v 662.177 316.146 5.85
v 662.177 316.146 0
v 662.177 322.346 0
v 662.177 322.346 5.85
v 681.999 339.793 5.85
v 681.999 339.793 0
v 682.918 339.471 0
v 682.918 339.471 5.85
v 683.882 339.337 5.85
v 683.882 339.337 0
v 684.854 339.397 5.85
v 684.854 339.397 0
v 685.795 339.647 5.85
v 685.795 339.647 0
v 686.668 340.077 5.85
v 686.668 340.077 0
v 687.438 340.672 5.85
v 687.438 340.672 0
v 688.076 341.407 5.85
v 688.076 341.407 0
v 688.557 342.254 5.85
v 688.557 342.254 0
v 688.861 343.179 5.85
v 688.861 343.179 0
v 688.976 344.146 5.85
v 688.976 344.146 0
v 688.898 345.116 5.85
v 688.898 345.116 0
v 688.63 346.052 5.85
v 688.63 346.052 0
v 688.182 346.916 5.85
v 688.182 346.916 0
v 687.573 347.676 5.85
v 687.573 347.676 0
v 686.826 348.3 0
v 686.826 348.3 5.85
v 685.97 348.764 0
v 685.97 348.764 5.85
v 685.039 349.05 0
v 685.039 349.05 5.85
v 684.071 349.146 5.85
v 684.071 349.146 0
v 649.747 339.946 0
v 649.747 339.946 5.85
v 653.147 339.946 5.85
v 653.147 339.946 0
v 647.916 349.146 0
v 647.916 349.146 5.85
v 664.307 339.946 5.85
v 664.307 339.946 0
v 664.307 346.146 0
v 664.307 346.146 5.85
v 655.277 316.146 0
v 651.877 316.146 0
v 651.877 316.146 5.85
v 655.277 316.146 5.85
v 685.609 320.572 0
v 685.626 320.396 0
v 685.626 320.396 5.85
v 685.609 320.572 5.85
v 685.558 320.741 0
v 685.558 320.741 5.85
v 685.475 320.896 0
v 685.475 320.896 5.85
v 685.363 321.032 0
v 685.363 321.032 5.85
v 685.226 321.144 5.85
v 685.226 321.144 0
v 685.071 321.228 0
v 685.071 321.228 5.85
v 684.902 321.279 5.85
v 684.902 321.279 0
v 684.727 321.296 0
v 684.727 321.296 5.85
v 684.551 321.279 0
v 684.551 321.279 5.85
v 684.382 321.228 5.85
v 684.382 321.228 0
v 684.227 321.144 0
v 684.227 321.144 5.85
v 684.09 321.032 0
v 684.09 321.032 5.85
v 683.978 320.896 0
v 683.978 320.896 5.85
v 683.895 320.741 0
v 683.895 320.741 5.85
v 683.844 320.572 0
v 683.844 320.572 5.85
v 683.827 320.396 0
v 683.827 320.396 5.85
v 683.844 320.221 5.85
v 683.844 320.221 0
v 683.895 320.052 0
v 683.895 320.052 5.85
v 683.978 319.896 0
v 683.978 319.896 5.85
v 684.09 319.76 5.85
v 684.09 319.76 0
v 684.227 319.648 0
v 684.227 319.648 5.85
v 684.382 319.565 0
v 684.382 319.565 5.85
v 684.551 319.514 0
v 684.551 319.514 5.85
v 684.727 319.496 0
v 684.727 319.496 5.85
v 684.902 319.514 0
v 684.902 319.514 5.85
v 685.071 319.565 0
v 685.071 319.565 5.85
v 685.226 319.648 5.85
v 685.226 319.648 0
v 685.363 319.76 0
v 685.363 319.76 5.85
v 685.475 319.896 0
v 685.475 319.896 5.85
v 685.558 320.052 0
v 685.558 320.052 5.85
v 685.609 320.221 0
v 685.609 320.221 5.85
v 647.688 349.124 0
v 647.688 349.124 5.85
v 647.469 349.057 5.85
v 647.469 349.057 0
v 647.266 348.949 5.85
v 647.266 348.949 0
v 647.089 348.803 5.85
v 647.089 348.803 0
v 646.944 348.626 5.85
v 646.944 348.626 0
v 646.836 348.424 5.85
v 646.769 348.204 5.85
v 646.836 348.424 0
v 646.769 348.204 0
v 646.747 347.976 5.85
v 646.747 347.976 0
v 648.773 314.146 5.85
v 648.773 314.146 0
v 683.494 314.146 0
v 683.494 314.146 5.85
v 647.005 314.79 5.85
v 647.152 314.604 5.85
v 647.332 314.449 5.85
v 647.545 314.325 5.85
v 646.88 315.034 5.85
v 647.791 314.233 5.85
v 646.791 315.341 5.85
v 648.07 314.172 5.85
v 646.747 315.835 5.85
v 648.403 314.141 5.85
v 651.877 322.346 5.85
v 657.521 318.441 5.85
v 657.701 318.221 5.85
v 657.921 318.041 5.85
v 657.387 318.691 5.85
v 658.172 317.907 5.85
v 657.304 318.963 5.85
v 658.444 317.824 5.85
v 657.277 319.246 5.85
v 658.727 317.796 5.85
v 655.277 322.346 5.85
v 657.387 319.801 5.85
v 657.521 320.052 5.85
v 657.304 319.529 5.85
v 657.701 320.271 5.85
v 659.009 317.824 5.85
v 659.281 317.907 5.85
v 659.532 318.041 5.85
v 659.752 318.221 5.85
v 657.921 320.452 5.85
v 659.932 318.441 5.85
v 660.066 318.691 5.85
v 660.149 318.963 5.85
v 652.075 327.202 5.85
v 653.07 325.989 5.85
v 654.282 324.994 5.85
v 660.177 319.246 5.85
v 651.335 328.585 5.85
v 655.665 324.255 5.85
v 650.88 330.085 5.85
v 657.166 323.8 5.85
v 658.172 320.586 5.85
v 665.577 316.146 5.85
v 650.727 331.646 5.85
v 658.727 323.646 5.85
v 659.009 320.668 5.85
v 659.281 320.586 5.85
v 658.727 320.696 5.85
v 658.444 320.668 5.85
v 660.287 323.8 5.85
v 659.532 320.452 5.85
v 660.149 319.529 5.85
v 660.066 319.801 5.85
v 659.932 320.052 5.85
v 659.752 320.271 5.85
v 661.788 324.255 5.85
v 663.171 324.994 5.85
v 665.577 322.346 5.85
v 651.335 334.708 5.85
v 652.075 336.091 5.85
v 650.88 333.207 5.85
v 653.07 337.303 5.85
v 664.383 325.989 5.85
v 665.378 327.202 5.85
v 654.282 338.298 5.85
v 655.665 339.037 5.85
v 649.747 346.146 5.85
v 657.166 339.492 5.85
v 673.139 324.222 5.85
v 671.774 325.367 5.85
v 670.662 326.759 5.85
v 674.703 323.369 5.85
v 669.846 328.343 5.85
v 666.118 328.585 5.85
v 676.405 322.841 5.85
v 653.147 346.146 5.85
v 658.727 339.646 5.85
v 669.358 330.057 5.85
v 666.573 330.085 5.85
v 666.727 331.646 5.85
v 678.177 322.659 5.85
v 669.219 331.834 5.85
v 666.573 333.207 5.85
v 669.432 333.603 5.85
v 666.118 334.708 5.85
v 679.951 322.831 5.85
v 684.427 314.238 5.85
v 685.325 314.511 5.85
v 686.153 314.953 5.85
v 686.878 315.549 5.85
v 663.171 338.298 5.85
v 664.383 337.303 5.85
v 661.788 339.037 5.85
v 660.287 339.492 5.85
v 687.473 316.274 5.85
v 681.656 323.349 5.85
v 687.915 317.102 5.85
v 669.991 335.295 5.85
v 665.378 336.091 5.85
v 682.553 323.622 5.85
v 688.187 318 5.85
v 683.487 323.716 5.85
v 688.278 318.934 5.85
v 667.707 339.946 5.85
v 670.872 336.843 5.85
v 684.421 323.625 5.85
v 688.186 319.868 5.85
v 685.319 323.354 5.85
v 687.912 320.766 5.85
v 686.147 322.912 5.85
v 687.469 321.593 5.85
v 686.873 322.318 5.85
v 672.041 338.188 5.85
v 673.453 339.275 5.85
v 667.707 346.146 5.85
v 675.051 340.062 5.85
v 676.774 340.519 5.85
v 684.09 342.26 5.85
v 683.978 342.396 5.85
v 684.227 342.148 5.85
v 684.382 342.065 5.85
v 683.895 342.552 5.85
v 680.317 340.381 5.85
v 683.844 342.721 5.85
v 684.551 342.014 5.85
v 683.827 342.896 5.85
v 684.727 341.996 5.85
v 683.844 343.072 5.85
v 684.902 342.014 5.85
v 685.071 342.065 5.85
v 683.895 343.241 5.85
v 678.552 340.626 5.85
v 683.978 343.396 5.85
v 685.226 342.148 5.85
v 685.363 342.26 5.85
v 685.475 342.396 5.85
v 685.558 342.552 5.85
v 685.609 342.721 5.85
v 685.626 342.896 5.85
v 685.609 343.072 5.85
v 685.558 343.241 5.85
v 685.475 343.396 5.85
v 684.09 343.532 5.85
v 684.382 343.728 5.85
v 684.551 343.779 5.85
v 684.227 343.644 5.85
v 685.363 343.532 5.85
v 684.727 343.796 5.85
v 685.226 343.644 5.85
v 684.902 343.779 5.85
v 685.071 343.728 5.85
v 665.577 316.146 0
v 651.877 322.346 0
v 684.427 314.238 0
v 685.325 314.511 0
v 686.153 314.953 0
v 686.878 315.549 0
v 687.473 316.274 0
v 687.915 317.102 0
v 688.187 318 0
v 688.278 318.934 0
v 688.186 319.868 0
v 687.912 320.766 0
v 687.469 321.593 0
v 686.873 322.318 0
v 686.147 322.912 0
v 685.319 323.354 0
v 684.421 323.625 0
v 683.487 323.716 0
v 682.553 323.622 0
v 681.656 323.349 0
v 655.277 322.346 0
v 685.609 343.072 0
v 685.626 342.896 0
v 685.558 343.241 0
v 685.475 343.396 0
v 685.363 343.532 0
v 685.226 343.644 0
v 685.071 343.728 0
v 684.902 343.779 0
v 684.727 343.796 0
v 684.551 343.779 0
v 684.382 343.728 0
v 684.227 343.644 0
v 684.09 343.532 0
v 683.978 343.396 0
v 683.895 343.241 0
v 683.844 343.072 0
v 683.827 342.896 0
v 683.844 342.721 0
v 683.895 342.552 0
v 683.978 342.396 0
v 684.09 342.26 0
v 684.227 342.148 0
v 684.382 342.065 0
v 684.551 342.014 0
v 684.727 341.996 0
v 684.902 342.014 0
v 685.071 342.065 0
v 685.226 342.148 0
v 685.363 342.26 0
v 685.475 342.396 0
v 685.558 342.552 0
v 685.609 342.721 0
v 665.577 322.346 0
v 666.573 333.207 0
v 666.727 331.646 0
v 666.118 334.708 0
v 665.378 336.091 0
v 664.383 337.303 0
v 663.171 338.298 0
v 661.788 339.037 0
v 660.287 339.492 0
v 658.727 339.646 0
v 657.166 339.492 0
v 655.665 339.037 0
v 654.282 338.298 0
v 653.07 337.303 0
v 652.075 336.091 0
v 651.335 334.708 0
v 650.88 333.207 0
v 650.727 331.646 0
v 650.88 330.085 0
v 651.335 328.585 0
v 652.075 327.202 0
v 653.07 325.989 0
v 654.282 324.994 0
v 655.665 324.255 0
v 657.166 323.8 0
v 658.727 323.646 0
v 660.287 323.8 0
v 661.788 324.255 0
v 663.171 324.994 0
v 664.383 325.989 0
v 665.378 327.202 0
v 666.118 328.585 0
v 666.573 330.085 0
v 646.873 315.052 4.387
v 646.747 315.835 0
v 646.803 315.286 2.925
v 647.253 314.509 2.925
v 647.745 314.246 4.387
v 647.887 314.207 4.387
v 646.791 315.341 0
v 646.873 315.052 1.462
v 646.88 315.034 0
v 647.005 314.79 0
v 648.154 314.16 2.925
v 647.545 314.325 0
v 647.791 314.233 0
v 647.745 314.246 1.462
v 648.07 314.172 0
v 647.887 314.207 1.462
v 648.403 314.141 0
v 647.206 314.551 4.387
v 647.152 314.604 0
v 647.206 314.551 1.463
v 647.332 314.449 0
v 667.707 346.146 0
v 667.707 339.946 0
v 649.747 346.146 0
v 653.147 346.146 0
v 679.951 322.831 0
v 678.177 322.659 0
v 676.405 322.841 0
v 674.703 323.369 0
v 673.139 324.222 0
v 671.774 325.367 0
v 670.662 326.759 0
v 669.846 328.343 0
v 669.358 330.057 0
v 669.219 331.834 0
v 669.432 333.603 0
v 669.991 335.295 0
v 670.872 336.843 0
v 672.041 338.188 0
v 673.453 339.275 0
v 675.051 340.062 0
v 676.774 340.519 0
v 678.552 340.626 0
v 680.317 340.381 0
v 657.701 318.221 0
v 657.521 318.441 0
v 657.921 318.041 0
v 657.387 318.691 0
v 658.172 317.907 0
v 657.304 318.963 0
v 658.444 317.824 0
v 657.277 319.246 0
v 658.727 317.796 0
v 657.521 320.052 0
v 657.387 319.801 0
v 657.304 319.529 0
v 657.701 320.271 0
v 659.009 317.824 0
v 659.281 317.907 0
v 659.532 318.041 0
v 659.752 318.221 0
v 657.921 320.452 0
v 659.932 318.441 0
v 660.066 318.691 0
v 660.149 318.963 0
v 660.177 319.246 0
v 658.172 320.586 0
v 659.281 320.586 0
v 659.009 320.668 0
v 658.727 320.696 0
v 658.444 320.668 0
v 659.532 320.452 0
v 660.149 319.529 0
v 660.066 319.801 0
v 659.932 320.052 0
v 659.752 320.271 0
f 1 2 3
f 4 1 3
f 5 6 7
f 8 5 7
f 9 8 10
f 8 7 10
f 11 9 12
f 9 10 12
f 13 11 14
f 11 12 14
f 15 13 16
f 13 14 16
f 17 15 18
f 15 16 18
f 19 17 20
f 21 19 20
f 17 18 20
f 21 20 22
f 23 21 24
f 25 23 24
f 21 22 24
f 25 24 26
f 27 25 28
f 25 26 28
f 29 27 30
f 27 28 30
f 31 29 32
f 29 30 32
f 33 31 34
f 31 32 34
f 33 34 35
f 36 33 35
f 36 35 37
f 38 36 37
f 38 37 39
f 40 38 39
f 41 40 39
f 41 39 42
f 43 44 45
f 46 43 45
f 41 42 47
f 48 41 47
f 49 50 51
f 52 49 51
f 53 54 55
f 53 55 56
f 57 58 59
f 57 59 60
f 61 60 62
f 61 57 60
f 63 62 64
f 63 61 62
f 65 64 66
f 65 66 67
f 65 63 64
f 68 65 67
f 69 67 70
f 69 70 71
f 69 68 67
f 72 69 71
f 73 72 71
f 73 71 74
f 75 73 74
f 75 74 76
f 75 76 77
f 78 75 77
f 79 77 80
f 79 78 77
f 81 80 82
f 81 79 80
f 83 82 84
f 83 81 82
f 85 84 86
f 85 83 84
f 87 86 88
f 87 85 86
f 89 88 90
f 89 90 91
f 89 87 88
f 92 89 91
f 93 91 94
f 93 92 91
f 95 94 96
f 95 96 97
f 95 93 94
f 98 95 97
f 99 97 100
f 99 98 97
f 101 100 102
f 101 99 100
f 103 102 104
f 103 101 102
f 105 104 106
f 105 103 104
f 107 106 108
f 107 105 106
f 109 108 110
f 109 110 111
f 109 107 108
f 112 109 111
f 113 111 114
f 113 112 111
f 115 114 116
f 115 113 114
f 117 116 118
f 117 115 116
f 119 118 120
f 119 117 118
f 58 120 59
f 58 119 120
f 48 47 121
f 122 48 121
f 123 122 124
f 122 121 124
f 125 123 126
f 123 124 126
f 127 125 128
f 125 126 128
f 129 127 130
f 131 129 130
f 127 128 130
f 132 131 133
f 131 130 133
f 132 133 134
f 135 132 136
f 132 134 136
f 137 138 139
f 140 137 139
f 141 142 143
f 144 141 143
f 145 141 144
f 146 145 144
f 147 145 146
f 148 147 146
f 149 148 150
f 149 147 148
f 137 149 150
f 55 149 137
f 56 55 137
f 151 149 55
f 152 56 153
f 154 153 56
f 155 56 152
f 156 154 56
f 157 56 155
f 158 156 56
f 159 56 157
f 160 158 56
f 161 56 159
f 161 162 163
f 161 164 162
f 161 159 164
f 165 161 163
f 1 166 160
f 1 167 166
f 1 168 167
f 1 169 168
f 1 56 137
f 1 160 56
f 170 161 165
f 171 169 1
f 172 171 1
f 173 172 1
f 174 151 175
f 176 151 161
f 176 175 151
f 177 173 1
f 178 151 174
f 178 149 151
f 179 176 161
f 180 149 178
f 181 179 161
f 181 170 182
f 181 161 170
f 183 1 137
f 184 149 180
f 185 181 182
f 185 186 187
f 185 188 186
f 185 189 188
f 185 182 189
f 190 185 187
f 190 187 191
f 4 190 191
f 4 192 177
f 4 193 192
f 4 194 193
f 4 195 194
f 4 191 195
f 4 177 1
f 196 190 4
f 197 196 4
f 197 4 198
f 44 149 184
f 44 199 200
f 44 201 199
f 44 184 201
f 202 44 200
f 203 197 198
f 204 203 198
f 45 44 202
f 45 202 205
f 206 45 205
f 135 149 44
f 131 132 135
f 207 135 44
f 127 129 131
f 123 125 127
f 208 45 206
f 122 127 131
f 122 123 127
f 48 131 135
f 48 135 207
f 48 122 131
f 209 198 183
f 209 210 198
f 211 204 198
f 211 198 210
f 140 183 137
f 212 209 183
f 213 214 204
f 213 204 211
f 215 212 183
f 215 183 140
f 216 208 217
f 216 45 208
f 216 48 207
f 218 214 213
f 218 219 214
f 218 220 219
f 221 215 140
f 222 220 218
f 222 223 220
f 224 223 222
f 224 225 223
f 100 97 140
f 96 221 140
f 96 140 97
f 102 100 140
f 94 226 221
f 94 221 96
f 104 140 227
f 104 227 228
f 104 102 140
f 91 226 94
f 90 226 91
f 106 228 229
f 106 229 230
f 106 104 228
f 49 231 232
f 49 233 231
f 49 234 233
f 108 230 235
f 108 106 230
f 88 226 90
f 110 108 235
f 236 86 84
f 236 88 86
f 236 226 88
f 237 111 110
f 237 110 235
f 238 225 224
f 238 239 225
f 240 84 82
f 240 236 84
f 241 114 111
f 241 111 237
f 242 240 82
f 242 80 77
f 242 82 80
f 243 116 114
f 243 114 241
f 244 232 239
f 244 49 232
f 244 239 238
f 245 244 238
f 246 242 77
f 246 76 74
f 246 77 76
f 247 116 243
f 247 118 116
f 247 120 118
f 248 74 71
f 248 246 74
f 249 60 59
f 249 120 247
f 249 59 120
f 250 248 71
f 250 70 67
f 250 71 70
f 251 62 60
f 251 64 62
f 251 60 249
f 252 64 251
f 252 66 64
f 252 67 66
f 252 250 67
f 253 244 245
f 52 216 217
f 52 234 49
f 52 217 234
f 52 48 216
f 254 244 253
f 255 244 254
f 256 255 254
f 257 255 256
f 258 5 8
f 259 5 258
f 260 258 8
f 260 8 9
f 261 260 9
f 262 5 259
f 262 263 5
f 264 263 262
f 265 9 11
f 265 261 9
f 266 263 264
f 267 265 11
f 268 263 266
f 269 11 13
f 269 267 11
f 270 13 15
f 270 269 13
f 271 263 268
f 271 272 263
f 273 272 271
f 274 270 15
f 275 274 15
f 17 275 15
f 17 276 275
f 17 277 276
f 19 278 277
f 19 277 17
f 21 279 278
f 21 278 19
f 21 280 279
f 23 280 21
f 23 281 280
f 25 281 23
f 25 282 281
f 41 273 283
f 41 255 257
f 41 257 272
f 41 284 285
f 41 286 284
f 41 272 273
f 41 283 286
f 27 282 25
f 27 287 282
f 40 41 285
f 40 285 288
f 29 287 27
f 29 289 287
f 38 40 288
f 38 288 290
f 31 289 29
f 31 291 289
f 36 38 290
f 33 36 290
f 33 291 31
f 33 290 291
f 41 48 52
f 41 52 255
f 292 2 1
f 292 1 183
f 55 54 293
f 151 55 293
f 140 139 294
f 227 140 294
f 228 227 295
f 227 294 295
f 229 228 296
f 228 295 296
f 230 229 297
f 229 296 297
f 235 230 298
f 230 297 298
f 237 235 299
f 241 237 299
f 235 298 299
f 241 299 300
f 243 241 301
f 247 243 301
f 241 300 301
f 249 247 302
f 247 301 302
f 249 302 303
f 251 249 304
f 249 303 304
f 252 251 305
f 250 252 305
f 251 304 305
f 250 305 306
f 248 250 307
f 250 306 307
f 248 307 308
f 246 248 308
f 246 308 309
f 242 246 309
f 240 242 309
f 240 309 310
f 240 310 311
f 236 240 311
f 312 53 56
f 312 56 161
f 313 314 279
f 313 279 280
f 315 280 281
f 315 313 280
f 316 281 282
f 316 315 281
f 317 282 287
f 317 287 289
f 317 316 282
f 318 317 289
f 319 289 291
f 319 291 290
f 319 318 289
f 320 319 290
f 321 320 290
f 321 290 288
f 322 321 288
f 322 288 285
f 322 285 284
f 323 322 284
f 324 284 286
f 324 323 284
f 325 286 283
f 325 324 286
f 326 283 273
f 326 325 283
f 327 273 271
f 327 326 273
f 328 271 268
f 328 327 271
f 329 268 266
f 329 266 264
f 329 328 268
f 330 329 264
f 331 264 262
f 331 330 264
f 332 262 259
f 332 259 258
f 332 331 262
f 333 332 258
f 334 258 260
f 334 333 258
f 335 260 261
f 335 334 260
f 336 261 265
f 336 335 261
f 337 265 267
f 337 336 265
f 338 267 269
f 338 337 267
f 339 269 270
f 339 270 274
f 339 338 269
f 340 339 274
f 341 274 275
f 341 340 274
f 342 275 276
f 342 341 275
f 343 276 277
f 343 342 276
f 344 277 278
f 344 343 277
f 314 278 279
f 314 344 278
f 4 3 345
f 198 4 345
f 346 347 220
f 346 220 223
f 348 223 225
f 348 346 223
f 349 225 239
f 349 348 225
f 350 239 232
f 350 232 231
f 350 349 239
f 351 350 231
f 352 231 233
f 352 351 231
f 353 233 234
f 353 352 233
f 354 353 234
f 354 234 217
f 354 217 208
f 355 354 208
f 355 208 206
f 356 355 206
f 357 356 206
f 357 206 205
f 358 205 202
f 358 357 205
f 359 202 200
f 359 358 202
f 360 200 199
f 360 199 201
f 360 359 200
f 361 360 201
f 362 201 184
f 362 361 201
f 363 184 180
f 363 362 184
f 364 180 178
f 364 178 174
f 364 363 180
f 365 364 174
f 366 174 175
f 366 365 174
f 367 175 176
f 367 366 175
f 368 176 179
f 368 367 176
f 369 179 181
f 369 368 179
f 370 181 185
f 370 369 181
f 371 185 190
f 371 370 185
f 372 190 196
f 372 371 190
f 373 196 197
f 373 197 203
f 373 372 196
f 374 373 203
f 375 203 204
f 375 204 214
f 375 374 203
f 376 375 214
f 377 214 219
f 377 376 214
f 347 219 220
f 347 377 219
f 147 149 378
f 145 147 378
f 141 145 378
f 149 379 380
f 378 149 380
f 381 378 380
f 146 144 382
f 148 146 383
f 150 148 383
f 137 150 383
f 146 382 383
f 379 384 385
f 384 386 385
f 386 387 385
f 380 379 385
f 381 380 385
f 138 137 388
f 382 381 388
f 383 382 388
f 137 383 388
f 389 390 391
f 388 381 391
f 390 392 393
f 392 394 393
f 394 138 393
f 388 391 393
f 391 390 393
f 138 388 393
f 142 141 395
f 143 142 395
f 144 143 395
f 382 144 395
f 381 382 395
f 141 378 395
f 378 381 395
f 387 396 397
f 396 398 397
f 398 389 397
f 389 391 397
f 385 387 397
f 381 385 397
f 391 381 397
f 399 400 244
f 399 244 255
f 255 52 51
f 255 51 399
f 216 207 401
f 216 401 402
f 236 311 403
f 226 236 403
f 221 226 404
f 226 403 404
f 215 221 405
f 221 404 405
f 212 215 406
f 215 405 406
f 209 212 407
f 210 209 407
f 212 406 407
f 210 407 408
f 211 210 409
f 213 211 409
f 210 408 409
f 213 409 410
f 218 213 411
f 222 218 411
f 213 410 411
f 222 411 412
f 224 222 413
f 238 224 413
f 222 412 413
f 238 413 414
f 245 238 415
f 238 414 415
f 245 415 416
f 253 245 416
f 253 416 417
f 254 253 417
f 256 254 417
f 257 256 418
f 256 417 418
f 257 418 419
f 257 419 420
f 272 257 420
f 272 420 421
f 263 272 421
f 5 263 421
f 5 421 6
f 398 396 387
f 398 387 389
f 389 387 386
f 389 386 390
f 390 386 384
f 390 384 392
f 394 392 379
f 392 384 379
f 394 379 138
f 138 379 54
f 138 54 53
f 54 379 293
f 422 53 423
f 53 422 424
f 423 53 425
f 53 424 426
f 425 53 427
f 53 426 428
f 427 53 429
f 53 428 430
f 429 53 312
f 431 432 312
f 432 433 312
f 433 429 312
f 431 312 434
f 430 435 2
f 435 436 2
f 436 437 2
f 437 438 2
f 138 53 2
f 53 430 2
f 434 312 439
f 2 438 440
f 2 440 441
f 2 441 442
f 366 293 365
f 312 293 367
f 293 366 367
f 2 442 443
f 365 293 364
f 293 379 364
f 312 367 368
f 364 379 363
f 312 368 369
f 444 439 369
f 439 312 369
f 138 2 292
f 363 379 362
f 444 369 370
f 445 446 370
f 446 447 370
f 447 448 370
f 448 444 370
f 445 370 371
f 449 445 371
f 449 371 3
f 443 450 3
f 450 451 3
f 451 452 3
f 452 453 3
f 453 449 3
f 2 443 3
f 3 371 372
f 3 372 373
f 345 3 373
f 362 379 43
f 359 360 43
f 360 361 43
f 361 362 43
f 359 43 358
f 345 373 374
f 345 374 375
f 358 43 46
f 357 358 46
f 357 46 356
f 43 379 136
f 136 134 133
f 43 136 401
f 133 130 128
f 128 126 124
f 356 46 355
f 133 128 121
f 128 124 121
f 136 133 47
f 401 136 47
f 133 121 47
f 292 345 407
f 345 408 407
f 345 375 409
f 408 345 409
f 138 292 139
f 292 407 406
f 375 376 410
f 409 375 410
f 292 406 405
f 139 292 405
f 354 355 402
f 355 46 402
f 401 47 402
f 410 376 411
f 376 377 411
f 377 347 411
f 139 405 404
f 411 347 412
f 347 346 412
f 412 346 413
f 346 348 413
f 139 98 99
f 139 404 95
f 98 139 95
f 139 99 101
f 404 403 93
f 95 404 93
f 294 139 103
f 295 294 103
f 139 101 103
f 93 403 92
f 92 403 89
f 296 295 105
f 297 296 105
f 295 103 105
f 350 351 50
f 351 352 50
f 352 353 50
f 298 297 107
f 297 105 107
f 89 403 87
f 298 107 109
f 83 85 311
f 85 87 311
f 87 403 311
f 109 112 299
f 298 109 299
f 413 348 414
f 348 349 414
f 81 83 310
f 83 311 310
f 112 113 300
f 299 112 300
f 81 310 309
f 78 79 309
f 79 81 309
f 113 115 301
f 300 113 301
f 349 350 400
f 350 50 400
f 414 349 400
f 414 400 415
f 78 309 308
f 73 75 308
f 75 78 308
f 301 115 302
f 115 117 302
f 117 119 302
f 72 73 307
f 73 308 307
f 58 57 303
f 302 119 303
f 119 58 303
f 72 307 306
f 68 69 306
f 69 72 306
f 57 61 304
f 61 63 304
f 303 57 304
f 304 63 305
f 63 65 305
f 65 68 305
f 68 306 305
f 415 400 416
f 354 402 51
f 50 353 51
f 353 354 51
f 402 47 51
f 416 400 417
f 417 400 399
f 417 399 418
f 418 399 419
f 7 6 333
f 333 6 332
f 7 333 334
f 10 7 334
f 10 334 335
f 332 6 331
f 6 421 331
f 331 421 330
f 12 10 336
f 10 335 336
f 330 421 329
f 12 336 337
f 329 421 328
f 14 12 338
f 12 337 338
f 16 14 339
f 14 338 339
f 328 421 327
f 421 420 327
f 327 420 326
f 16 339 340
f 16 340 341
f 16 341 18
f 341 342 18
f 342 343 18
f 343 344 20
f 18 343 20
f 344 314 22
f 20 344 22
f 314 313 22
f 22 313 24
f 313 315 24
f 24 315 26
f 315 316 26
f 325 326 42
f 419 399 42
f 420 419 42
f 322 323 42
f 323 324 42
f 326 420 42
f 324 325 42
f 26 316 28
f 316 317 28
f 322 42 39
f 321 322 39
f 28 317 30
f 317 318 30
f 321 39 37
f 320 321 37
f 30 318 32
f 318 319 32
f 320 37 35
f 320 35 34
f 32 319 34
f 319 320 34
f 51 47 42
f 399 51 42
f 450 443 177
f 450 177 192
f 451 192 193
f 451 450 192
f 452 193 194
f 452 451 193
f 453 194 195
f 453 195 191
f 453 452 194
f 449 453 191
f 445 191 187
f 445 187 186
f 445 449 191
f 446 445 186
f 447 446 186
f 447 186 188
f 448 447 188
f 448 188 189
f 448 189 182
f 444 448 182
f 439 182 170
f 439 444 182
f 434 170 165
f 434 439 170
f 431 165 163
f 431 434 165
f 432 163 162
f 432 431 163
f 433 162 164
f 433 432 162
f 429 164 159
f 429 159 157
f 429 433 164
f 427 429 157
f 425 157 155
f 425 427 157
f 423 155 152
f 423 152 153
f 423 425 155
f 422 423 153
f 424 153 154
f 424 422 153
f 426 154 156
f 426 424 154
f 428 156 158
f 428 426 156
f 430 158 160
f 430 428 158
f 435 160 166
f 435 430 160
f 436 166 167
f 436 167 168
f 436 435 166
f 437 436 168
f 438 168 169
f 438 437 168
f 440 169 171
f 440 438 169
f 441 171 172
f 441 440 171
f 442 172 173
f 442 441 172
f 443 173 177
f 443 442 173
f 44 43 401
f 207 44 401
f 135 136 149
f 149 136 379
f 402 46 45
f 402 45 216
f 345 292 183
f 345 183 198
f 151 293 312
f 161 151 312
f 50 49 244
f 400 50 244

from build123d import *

# Parameters (mm, degrees)
SKETCH1_R           = 0.899918091
SKETCH1_R_2         = 0.899925125
SKETCH1_R_3         = 1.45
SKETCH1_R_4         = 8
SKETCH1_W           = 3.400011
SKETCH1_H           = 6.2
SKETCH1_W_2         = 3.4
BOSS_EXTRUDE2_DEPTH = 5.85


with BuildPart() as part:
    # Sketch1 → Boss-Extrude2 (new body)
    with BuildSketch(Plane.XY):
        with BuildLine():
            Line((669.21684417, 349.14615334), (647.916445931, 349.14615334))
            ThreePointArc((647.916445931, 349.14615334), (647.089176563, 348.803487148), (646.746510371, 347.976217781))
            Line((646.746510371, 347.976217781), (646.746510371, 315.835342781))
            add(Edge.make_bspline(
                [(646.746510371, 315.835342781), (646.746510371, 314.02716752), (648.773268796, 314.14615334)],
                knots=[0, 0, 0, 1, 1, 1], degree=2))
            Line((648.773268796, 314.14615334), (669.21684417, 314.14615334))
            Line((669.21684417, 314.14615334), (683.493527466, 314.14615334))
            ThreePointArc((683.493527466, 314.14615334), (688.18557682, 319.867900287), (681.655729571, 323.348533873))
            ThreePointArc((681.655729571, 323.348533873), (669.218799175, 331.833597772), (681.99878285, 339.792590441))
            ThreePointArc((681.99878285, 339.792590441), (688.860665305, 343.178948939), (684.070537296, 349.14615334))
            Line((684.070537296, 349.14615334), (669.21684417, 349.14615334))
        make_face()
        with Locations((684.726521371, 342.89615334)):
            Circle(SKETCH1_R, mode=Mode.SUBTRACT)
        with Locations((684.726521371, 320.39615334)):
            Circle(SKETCH1_R_2, mode=Mode.SUBTRACT)
        with Locations((658.726521371, 319.24615334)):
            Circle(SKETCH1_R_3, mode=Mode.SUBTRACT)
        with Locations((658.726521371, 331.64615334)):
            Circle(SKETCH1_R_4, mode=Mode.SUBTRACT)
        with Locations((651.446515871, 343.04615334)):
            Rectangle(SKETCH1_W, SKETCH1_H, mode=Mode.SUBTRACT)
        with Locations((653.576521371, 319.24615334)):
            Rectangle(SKETCH1_W_2, SKETCH1_H, mode=Mode.SUBTRACT)
        with Locations((666.006526871, 343.04615334)):
            Rectangle(SKETCH1_W, SKETCH1_H, mode=Mode.SUBTRACT)
        with Locations((663.876521371, 319.24615334)):
            Rectangle(SKETCH1_W_2, SKETCH1_H, mode=Mode.SUBTRACT)
    extrude(amount=BOSS_EXTRUDE2_DEPTH)


solid = part.part
